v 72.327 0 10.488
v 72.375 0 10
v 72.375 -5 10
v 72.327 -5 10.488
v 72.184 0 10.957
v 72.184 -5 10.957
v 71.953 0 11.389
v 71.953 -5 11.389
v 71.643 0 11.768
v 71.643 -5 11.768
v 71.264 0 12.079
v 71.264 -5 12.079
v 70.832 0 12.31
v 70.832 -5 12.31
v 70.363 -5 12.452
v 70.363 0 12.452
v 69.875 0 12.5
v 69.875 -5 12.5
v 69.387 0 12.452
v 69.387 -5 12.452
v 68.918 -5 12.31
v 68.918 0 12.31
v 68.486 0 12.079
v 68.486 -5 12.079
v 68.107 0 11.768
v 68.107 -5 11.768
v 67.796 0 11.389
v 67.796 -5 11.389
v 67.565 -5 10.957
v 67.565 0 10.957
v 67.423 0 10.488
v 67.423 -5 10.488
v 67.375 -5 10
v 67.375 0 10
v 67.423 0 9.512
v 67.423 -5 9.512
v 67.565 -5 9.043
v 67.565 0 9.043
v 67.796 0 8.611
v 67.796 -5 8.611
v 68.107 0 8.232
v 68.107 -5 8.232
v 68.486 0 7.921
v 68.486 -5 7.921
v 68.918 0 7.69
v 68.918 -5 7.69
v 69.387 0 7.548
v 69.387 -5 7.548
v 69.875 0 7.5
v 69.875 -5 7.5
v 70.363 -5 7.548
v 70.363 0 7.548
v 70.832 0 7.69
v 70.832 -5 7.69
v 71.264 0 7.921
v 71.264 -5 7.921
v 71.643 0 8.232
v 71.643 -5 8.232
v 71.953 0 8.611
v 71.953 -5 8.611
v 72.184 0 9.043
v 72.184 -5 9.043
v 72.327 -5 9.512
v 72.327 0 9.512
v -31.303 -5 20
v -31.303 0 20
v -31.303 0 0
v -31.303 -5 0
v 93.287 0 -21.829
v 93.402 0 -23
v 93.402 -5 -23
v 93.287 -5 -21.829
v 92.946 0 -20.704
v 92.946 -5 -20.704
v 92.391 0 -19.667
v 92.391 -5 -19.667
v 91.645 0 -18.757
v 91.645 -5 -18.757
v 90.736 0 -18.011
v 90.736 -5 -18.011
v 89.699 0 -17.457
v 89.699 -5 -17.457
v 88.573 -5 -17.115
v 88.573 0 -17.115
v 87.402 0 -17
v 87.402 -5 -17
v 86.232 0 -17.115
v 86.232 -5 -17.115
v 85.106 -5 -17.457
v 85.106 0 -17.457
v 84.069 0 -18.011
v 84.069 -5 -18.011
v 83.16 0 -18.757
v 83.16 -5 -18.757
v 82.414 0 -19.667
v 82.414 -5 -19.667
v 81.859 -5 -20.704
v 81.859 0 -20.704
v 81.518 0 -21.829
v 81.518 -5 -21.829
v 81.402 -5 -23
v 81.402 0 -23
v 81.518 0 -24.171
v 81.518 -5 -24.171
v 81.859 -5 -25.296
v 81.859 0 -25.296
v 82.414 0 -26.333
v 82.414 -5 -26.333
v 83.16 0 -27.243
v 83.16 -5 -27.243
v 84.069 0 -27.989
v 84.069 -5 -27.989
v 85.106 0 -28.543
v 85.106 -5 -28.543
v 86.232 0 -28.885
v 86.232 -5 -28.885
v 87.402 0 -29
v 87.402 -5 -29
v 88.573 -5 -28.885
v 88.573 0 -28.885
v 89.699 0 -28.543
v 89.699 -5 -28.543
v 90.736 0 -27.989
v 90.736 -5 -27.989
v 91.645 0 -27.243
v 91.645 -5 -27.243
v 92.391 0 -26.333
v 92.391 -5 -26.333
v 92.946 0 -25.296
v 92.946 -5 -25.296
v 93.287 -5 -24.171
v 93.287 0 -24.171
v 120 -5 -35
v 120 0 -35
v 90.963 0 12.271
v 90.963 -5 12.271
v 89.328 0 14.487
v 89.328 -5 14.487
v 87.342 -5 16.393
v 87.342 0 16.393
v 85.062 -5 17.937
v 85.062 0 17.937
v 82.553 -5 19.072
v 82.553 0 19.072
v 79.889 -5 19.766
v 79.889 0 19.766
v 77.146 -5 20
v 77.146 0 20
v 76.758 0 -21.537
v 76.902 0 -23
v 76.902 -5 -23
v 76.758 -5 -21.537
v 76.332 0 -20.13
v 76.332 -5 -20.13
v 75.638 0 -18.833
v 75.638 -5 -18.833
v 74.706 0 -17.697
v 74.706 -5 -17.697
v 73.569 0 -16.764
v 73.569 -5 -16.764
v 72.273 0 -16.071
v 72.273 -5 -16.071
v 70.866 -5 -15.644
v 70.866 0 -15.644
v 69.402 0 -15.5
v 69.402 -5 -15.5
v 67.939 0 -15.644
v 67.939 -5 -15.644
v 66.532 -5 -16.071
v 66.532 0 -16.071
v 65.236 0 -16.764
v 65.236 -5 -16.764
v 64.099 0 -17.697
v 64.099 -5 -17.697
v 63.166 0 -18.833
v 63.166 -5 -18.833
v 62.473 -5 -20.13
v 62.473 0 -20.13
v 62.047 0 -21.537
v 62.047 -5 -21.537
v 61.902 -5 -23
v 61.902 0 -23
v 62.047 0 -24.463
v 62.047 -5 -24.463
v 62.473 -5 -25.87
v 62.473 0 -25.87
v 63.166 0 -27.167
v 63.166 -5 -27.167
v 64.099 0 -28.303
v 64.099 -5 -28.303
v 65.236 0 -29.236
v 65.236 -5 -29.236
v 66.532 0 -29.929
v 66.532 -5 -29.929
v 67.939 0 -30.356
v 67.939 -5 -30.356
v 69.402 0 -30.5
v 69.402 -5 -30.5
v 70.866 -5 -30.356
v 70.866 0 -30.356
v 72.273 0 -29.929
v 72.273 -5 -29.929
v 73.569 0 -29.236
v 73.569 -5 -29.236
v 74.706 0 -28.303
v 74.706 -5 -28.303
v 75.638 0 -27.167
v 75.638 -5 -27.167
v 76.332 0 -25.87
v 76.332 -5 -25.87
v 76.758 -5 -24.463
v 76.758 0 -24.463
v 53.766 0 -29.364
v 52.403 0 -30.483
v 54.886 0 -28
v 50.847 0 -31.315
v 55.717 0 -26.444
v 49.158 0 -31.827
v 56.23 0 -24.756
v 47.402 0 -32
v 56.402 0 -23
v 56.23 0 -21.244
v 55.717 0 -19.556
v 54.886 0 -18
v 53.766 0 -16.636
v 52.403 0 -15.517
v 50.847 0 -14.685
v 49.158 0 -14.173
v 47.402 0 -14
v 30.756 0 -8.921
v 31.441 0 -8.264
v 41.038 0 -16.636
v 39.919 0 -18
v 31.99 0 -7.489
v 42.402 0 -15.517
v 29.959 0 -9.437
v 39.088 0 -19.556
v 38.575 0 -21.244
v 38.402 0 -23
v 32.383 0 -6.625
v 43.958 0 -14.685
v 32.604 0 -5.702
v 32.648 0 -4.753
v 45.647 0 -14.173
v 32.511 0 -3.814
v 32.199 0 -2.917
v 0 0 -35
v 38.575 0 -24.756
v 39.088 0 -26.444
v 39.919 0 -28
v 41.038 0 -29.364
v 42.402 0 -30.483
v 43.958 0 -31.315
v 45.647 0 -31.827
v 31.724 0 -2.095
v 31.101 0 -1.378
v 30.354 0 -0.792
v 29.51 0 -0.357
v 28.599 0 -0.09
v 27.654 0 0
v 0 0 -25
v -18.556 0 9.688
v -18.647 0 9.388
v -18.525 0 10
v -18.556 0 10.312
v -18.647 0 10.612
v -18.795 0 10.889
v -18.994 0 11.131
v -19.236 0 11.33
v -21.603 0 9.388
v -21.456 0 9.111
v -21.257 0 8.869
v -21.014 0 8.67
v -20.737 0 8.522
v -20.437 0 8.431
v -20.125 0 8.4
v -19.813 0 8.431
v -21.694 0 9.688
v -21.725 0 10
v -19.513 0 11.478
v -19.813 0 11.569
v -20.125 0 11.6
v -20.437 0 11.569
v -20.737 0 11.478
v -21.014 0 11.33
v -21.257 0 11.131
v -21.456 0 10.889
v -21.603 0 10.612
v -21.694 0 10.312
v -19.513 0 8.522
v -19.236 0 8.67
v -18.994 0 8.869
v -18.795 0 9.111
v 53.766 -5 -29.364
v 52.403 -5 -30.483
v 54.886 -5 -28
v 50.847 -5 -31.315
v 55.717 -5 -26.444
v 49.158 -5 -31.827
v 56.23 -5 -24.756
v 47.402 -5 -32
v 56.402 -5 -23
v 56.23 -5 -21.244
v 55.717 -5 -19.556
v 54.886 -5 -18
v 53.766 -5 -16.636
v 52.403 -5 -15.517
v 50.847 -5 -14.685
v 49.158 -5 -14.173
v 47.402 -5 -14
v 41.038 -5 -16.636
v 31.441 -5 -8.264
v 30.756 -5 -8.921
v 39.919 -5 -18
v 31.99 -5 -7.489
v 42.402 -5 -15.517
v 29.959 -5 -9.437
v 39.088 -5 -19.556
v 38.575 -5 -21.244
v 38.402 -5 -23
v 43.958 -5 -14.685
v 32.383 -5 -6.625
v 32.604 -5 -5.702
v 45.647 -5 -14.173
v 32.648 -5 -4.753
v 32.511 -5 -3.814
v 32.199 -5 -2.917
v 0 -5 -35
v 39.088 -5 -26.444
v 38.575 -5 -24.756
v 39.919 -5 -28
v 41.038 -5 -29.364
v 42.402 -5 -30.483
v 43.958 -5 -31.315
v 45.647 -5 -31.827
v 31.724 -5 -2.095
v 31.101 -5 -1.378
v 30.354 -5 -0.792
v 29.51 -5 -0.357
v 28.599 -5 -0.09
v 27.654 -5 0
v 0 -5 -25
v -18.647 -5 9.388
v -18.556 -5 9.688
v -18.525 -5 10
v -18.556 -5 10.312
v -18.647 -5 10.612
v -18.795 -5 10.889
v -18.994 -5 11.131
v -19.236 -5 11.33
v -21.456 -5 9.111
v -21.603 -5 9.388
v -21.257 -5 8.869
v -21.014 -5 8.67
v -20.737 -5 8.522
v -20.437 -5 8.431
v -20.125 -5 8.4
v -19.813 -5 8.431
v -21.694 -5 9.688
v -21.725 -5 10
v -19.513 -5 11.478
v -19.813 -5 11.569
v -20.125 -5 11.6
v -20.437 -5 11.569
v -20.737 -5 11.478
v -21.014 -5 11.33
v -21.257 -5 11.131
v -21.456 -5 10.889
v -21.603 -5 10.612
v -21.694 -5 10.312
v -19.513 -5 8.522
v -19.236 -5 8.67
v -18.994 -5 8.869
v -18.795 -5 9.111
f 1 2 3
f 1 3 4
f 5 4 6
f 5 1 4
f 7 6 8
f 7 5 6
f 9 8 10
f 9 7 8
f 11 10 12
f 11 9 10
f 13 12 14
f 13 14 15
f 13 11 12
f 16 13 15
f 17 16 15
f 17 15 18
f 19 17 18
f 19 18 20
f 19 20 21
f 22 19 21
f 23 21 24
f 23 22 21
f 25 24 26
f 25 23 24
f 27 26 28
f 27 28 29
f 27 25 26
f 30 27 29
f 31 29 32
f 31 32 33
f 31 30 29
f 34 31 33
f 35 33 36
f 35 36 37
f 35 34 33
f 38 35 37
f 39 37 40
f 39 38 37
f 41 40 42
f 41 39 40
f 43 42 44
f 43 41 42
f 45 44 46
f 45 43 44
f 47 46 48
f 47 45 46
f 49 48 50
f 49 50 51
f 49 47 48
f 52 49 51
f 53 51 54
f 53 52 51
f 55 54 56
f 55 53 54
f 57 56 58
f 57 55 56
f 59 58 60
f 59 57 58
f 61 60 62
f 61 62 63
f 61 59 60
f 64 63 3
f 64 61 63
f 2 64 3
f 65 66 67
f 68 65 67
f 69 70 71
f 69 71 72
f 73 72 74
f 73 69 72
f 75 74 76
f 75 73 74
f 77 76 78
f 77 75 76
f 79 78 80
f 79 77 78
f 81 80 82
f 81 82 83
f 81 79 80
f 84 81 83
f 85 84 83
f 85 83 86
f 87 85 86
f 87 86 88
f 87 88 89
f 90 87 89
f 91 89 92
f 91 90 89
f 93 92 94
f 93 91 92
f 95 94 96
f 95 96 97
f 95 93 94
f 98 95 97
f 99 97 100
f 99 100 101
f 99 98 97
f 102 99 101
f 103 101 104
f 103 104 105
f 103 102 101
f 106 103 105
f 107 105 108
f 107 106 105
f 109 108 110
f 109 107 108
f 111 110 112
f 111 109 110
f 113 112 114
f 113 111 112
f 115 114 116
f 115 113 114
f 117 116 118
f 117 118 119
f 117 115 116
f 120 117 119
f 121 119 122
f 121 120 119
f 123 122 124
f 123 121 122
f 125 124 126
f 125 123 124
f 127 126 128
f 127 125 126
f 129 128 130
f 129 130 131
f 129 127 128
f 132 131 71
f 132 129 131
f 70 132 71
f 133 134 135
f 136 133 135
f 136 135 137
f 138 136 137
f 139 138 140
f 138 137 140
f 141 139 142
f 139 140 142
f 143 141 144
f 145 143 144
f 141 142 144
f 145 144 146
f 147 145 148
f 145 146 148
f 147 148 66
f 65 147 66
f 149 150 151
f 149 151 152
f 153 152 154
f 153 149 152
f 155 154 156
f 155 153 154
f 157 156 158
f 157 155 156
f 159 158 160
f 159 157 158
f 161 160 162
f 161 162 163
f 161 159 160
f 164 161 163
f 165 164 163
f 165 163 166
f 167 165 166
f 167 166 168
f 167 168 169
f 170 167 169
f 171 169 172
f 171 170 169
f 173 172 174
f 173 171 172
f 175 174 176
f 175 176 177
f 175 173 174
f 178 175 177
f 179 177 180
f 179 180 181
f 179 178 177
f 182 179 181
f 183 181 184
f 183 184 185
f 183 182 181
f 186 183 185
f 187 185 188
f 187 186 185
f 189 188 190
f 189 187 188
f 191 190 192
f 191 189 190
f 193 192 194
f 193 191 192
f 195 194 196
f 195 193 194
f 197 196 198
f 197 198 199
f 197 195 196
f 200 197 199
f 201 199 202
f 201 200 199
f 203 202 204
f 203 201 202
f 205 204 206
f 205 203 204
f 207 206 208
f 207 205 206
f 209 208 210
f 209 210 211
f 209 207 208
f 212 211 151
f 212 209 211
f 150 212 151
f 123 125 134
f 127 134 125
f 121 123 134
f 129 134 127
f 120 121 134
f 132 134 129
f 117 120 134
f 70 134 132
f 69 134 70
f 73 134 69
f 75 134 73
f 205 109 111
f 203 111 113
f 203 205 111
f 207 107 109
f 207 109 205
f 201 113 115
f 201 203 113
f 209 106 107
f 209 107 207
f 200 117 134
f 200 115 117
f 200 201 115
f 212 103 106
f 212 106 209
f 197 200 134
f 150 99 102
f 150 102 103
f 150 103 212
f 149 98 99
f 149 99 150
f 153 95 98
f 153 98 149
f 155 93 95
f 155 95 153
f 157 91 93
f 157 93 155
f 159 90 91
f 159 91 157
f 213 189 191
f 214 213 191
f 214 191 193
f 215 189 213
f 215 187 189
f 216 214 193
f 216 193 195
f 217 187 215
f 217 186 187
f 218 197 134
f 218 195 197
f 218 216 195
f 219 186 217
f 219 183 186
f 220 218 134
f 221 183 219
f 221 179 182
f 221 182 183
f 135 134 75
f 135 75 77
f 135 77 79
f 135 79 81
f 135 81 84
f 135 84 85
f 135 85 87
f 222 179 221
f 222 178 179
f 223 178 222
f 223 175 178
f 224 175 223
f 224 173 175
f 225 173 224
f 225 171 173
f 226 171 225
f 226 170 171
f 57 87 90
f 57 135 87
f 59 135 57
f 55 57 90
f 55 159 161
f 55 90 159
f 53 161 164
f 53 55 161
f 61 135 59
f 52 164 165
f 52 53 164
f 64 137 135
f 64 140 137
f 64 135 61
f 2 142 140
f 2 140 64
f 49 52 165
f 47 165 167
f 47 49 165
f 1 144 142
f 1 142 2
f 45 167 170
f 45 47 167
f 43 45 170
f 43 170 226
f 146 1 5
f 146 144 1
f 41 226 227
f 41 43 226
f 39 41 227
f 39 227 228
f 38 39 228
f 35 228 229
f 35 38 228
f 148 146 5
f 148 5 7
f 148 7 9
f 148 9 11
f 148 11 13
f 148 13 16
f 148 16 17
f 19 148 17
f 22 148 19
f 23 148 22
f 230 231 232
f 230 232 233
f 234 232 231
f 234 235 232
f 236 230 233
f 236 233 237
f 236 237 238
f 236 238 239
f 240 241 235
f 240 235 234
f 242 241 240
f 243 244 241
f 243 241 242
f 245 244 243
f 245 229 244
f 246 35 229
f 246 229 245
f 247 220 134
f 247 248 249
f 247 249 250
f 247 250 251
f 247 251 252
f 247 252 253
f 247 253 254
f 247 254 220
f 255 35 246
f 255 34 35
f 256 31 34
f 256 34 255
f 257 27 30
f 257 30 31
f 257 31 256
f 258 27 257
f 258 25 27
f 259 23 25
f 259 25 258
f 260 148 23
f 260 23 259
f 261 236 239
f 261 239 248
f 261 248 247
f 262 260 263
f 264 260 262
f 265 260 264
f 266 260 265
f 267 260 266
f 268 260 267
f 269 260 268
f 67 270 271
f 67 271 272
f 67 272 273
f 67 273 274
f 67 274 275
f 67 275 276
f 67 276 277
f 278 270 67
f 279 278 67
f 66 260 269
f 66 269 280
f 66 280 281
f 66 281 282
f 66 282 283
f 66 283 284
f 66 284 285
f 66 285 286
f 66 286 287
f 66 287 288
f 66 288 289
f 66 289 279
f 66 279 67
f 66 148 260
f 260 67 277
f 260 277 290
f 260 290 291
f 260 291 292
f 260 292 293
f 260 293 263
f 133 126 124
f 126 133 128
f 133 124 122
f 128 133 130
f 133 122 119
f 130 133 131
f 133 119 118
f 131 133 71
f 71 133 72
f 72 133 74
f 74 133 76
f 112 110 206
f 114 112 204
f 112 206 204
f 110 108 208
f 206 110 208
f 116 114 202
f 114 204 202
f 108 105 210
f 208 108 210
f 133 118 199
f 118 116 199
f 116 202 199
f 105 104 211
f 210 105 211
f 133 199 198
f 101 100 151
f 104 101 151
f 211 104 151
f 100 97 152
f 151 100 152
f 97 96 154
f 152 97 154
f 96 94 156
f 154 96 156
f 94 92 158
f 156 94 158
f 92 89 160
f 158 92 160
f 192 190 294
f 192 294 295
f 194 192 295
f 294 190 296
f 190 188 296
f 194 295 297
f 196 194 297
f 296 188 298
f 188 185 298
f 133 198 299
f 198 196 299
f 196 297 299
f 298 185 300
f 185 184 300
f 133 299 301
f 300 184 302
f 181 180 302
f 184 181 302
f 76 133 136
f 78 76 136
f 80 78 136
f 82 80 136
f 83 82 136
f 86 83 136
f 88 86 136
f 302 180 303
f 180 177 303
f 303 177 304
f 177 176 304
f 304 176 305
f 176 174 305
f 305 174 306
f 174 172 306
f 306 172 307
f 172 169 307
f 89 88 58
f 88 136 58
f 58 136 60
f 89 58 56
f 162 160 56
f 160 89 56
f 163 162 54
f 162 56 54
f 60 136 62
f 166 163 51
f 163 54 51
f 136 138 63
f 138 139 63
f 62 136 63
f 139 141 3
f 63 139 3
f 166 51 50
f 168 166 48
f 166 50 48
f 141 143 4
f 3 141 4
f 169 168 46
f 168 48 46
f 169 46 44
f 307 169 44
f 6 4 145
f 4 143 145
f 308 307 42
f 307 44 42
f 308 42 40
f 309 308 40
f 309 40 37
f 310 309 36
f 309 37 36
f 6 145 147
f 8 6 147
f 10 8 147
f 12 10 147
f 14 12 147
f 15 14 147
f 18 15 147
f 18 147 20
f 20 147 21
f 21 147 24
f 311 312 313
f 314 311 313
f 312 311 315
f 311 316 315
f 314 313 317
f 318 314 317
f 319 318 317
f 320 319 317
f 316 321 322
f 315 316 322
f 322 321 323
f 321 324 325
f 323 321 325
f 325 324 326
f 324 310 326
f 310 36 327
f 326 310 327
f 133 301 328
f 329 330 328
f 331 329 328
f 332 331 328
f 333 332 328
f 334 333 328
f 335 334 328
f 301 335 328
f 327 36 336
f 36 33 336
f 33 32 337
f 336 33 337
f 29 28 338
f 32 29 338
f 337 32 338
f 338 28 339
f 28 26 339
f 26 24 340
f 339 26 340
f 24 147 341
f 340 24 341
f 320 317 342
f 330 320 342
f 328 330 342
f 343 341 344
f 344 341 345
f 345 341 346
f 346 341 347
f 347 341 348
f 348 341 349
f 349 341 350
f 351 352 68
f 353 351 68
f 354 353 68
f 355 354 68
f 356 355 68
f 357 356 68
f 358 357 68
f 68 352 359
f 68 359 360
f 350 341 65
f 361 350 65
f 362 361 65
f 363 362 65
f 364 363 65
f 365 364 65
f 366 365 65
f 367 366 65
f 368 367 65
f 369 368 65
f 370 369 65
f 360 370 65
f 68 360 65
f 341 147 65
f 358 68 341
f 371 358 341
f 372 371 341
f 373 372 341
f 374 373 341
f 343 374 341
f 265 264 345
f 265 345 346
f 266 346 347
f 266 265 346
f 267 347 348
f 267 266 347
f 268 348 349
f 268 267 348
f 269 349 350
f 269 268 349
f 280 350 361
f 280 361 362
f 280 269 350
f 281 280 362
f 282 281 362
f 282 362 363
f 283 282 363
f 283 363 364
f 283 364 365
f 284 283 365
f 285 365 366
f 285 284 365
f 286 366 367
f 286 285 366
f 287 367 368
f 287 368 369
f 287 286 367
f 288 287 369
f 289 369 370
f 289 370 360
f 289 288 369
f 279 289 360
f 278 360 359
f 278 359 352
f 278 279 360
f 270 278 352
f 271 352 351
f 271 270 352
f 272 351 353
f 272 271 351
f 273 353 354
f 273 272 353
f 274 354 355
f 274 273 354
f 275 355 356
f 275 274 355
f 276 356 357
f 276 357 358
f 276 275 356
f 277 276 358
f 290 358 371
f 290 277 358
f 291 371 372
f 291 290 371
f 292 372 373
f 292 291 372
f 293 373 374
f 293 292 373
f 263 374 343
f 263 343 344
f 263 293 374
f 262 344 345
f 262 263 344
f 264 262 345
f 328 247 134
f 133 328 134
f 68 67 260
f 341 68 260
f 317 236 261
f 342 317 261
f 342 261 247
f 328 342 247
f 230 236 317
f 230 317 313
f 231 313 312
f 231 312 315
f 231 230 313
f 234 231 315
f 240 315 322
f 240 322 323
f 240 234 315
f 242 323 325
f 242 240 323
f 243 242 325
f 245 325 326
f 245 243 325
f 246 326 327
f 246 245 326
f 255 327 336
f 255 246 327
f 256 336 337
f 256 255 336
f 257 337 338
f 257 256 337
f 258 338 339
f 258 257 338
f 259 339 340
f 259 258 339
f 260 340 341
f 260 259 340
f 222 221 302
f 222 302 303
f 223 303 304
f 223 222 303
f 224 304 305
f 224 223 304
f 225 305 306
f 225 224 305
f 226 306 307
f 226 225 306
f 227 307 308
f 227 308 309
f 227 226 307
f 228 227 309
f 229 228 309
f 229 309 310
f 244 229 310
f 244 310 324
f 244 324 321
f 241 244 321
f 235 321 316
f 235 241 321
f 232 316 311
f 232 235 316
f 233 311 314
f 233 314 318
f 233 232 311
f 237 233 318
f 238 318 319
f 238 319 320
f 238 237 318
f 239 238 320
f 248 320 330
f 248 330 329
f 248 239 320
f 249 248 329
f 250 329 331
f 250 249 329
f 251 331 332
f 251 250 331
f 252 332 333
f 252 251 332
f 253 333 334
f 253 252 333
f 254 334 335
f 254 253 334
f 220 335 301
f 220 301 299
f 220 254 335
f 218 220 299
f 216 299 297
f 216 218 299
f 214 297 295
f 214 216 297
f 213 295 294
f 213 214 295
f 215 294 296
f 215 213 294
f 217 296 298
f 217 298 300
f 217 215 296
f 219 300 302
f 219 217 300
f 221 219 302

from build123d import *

# Parameters (mm, degrees)
F0_R        = 9
F0_R_2      = 7.5
F0_R_3      = 6
F0_R_4      = 1.6
F0_R_5      = 2.5
F1_DEPTH    = 5
F2_T1_DEPTH = 5


# Not quite as in the source:
# - a fillet or chamfer that OpenCascade refuses, or shapes differently, is made with other operations: its cross-section is extruded or revolved along the edge and cut away or added


with BuildPart() as f1:
    # F0 (on Front) → F1 (new body)
    with BuildSketch(Plane.XZ):
        with BuildLine():
            Line((77.14561722, 20), (-0.2484538774, 20))
            Line((-0.2484538774, 20), (-29.0604767571, 20))
            Line((-29.0604767571, 20), (-31.3025846086, 20))
            Line((-31.3025846086, 20), (-31.3025846086, 0))
            Line((-31.3025846086, 0), (0, 0))
            Line((0, 0), (33.9829302539, 0))
            ThreePointArc((33.9829302539, 0), (34.7117105365, -4.7760782671), (31.6838696315, -8.540945299))
            Line((31.6838696315, -8.540945299), (0, -25))
            Line((0, -25), (0, -35))
            Line((0, -35), (120, -35))
            Line((120, -35), (90.9631787703, 12.2713973983))
            ThreePointArc((90.9631787703, 12.2713973983), (85.0616816679, 17.9365681271), (77.14561722, 20))
        make_face()
        with Locations((47.4024499138, -23)):
            Circle(F0_R, mode=Mode.SUBTRACT)
        with Locations((69.4024499138, -23)):
            Circle(F0_R_2, mode=Mode.SUBTRACT)
        with Locations((87.4024499138, -23)):
            Circle(F0_R_3, mode=Mode.SUBTRACT)
        with Locations((-20.1252056134, 10)):
            Circle(F0_R_4, mode=Mode.SUBTRACT)
        with Locations((69.8747943866, 10)):
            Circle(F0_R_5, mode=Mode.SUBTRACT)
    extrude(amount=F1_DEPTH)

    # F2: fillet of radius 5 on 2 edges, made by hand

    # F2_s2 → F2_t1 (join)
    with BuildSketch(Plane.XZ):
        with BuildLine():
            ThreePointArc((29.9588910165, -9.4370327313), (32.5111722793, -3.8136534352), (27.6539527219, 0))
            Line((27.6539527219, 0), (27.6539527219, 0.5))
            Line((27.6539527219, 0.5), (33.9829302539, 0.5))
            Line((33.9829302539, 0.5), (34.4050124686, 0.2680421685))
            ThreePointArc((34.4050124686, 0.2680421685), (31.914363461, -8.9846485721), (30.189384846, -9.8807360044))
            Line((30.189384846, -9.8807360044), (29.9588910165, -9.4370327313))
        make_face()
    extrude(amount=F2_T1_DEPTH)


solid = f1.part
